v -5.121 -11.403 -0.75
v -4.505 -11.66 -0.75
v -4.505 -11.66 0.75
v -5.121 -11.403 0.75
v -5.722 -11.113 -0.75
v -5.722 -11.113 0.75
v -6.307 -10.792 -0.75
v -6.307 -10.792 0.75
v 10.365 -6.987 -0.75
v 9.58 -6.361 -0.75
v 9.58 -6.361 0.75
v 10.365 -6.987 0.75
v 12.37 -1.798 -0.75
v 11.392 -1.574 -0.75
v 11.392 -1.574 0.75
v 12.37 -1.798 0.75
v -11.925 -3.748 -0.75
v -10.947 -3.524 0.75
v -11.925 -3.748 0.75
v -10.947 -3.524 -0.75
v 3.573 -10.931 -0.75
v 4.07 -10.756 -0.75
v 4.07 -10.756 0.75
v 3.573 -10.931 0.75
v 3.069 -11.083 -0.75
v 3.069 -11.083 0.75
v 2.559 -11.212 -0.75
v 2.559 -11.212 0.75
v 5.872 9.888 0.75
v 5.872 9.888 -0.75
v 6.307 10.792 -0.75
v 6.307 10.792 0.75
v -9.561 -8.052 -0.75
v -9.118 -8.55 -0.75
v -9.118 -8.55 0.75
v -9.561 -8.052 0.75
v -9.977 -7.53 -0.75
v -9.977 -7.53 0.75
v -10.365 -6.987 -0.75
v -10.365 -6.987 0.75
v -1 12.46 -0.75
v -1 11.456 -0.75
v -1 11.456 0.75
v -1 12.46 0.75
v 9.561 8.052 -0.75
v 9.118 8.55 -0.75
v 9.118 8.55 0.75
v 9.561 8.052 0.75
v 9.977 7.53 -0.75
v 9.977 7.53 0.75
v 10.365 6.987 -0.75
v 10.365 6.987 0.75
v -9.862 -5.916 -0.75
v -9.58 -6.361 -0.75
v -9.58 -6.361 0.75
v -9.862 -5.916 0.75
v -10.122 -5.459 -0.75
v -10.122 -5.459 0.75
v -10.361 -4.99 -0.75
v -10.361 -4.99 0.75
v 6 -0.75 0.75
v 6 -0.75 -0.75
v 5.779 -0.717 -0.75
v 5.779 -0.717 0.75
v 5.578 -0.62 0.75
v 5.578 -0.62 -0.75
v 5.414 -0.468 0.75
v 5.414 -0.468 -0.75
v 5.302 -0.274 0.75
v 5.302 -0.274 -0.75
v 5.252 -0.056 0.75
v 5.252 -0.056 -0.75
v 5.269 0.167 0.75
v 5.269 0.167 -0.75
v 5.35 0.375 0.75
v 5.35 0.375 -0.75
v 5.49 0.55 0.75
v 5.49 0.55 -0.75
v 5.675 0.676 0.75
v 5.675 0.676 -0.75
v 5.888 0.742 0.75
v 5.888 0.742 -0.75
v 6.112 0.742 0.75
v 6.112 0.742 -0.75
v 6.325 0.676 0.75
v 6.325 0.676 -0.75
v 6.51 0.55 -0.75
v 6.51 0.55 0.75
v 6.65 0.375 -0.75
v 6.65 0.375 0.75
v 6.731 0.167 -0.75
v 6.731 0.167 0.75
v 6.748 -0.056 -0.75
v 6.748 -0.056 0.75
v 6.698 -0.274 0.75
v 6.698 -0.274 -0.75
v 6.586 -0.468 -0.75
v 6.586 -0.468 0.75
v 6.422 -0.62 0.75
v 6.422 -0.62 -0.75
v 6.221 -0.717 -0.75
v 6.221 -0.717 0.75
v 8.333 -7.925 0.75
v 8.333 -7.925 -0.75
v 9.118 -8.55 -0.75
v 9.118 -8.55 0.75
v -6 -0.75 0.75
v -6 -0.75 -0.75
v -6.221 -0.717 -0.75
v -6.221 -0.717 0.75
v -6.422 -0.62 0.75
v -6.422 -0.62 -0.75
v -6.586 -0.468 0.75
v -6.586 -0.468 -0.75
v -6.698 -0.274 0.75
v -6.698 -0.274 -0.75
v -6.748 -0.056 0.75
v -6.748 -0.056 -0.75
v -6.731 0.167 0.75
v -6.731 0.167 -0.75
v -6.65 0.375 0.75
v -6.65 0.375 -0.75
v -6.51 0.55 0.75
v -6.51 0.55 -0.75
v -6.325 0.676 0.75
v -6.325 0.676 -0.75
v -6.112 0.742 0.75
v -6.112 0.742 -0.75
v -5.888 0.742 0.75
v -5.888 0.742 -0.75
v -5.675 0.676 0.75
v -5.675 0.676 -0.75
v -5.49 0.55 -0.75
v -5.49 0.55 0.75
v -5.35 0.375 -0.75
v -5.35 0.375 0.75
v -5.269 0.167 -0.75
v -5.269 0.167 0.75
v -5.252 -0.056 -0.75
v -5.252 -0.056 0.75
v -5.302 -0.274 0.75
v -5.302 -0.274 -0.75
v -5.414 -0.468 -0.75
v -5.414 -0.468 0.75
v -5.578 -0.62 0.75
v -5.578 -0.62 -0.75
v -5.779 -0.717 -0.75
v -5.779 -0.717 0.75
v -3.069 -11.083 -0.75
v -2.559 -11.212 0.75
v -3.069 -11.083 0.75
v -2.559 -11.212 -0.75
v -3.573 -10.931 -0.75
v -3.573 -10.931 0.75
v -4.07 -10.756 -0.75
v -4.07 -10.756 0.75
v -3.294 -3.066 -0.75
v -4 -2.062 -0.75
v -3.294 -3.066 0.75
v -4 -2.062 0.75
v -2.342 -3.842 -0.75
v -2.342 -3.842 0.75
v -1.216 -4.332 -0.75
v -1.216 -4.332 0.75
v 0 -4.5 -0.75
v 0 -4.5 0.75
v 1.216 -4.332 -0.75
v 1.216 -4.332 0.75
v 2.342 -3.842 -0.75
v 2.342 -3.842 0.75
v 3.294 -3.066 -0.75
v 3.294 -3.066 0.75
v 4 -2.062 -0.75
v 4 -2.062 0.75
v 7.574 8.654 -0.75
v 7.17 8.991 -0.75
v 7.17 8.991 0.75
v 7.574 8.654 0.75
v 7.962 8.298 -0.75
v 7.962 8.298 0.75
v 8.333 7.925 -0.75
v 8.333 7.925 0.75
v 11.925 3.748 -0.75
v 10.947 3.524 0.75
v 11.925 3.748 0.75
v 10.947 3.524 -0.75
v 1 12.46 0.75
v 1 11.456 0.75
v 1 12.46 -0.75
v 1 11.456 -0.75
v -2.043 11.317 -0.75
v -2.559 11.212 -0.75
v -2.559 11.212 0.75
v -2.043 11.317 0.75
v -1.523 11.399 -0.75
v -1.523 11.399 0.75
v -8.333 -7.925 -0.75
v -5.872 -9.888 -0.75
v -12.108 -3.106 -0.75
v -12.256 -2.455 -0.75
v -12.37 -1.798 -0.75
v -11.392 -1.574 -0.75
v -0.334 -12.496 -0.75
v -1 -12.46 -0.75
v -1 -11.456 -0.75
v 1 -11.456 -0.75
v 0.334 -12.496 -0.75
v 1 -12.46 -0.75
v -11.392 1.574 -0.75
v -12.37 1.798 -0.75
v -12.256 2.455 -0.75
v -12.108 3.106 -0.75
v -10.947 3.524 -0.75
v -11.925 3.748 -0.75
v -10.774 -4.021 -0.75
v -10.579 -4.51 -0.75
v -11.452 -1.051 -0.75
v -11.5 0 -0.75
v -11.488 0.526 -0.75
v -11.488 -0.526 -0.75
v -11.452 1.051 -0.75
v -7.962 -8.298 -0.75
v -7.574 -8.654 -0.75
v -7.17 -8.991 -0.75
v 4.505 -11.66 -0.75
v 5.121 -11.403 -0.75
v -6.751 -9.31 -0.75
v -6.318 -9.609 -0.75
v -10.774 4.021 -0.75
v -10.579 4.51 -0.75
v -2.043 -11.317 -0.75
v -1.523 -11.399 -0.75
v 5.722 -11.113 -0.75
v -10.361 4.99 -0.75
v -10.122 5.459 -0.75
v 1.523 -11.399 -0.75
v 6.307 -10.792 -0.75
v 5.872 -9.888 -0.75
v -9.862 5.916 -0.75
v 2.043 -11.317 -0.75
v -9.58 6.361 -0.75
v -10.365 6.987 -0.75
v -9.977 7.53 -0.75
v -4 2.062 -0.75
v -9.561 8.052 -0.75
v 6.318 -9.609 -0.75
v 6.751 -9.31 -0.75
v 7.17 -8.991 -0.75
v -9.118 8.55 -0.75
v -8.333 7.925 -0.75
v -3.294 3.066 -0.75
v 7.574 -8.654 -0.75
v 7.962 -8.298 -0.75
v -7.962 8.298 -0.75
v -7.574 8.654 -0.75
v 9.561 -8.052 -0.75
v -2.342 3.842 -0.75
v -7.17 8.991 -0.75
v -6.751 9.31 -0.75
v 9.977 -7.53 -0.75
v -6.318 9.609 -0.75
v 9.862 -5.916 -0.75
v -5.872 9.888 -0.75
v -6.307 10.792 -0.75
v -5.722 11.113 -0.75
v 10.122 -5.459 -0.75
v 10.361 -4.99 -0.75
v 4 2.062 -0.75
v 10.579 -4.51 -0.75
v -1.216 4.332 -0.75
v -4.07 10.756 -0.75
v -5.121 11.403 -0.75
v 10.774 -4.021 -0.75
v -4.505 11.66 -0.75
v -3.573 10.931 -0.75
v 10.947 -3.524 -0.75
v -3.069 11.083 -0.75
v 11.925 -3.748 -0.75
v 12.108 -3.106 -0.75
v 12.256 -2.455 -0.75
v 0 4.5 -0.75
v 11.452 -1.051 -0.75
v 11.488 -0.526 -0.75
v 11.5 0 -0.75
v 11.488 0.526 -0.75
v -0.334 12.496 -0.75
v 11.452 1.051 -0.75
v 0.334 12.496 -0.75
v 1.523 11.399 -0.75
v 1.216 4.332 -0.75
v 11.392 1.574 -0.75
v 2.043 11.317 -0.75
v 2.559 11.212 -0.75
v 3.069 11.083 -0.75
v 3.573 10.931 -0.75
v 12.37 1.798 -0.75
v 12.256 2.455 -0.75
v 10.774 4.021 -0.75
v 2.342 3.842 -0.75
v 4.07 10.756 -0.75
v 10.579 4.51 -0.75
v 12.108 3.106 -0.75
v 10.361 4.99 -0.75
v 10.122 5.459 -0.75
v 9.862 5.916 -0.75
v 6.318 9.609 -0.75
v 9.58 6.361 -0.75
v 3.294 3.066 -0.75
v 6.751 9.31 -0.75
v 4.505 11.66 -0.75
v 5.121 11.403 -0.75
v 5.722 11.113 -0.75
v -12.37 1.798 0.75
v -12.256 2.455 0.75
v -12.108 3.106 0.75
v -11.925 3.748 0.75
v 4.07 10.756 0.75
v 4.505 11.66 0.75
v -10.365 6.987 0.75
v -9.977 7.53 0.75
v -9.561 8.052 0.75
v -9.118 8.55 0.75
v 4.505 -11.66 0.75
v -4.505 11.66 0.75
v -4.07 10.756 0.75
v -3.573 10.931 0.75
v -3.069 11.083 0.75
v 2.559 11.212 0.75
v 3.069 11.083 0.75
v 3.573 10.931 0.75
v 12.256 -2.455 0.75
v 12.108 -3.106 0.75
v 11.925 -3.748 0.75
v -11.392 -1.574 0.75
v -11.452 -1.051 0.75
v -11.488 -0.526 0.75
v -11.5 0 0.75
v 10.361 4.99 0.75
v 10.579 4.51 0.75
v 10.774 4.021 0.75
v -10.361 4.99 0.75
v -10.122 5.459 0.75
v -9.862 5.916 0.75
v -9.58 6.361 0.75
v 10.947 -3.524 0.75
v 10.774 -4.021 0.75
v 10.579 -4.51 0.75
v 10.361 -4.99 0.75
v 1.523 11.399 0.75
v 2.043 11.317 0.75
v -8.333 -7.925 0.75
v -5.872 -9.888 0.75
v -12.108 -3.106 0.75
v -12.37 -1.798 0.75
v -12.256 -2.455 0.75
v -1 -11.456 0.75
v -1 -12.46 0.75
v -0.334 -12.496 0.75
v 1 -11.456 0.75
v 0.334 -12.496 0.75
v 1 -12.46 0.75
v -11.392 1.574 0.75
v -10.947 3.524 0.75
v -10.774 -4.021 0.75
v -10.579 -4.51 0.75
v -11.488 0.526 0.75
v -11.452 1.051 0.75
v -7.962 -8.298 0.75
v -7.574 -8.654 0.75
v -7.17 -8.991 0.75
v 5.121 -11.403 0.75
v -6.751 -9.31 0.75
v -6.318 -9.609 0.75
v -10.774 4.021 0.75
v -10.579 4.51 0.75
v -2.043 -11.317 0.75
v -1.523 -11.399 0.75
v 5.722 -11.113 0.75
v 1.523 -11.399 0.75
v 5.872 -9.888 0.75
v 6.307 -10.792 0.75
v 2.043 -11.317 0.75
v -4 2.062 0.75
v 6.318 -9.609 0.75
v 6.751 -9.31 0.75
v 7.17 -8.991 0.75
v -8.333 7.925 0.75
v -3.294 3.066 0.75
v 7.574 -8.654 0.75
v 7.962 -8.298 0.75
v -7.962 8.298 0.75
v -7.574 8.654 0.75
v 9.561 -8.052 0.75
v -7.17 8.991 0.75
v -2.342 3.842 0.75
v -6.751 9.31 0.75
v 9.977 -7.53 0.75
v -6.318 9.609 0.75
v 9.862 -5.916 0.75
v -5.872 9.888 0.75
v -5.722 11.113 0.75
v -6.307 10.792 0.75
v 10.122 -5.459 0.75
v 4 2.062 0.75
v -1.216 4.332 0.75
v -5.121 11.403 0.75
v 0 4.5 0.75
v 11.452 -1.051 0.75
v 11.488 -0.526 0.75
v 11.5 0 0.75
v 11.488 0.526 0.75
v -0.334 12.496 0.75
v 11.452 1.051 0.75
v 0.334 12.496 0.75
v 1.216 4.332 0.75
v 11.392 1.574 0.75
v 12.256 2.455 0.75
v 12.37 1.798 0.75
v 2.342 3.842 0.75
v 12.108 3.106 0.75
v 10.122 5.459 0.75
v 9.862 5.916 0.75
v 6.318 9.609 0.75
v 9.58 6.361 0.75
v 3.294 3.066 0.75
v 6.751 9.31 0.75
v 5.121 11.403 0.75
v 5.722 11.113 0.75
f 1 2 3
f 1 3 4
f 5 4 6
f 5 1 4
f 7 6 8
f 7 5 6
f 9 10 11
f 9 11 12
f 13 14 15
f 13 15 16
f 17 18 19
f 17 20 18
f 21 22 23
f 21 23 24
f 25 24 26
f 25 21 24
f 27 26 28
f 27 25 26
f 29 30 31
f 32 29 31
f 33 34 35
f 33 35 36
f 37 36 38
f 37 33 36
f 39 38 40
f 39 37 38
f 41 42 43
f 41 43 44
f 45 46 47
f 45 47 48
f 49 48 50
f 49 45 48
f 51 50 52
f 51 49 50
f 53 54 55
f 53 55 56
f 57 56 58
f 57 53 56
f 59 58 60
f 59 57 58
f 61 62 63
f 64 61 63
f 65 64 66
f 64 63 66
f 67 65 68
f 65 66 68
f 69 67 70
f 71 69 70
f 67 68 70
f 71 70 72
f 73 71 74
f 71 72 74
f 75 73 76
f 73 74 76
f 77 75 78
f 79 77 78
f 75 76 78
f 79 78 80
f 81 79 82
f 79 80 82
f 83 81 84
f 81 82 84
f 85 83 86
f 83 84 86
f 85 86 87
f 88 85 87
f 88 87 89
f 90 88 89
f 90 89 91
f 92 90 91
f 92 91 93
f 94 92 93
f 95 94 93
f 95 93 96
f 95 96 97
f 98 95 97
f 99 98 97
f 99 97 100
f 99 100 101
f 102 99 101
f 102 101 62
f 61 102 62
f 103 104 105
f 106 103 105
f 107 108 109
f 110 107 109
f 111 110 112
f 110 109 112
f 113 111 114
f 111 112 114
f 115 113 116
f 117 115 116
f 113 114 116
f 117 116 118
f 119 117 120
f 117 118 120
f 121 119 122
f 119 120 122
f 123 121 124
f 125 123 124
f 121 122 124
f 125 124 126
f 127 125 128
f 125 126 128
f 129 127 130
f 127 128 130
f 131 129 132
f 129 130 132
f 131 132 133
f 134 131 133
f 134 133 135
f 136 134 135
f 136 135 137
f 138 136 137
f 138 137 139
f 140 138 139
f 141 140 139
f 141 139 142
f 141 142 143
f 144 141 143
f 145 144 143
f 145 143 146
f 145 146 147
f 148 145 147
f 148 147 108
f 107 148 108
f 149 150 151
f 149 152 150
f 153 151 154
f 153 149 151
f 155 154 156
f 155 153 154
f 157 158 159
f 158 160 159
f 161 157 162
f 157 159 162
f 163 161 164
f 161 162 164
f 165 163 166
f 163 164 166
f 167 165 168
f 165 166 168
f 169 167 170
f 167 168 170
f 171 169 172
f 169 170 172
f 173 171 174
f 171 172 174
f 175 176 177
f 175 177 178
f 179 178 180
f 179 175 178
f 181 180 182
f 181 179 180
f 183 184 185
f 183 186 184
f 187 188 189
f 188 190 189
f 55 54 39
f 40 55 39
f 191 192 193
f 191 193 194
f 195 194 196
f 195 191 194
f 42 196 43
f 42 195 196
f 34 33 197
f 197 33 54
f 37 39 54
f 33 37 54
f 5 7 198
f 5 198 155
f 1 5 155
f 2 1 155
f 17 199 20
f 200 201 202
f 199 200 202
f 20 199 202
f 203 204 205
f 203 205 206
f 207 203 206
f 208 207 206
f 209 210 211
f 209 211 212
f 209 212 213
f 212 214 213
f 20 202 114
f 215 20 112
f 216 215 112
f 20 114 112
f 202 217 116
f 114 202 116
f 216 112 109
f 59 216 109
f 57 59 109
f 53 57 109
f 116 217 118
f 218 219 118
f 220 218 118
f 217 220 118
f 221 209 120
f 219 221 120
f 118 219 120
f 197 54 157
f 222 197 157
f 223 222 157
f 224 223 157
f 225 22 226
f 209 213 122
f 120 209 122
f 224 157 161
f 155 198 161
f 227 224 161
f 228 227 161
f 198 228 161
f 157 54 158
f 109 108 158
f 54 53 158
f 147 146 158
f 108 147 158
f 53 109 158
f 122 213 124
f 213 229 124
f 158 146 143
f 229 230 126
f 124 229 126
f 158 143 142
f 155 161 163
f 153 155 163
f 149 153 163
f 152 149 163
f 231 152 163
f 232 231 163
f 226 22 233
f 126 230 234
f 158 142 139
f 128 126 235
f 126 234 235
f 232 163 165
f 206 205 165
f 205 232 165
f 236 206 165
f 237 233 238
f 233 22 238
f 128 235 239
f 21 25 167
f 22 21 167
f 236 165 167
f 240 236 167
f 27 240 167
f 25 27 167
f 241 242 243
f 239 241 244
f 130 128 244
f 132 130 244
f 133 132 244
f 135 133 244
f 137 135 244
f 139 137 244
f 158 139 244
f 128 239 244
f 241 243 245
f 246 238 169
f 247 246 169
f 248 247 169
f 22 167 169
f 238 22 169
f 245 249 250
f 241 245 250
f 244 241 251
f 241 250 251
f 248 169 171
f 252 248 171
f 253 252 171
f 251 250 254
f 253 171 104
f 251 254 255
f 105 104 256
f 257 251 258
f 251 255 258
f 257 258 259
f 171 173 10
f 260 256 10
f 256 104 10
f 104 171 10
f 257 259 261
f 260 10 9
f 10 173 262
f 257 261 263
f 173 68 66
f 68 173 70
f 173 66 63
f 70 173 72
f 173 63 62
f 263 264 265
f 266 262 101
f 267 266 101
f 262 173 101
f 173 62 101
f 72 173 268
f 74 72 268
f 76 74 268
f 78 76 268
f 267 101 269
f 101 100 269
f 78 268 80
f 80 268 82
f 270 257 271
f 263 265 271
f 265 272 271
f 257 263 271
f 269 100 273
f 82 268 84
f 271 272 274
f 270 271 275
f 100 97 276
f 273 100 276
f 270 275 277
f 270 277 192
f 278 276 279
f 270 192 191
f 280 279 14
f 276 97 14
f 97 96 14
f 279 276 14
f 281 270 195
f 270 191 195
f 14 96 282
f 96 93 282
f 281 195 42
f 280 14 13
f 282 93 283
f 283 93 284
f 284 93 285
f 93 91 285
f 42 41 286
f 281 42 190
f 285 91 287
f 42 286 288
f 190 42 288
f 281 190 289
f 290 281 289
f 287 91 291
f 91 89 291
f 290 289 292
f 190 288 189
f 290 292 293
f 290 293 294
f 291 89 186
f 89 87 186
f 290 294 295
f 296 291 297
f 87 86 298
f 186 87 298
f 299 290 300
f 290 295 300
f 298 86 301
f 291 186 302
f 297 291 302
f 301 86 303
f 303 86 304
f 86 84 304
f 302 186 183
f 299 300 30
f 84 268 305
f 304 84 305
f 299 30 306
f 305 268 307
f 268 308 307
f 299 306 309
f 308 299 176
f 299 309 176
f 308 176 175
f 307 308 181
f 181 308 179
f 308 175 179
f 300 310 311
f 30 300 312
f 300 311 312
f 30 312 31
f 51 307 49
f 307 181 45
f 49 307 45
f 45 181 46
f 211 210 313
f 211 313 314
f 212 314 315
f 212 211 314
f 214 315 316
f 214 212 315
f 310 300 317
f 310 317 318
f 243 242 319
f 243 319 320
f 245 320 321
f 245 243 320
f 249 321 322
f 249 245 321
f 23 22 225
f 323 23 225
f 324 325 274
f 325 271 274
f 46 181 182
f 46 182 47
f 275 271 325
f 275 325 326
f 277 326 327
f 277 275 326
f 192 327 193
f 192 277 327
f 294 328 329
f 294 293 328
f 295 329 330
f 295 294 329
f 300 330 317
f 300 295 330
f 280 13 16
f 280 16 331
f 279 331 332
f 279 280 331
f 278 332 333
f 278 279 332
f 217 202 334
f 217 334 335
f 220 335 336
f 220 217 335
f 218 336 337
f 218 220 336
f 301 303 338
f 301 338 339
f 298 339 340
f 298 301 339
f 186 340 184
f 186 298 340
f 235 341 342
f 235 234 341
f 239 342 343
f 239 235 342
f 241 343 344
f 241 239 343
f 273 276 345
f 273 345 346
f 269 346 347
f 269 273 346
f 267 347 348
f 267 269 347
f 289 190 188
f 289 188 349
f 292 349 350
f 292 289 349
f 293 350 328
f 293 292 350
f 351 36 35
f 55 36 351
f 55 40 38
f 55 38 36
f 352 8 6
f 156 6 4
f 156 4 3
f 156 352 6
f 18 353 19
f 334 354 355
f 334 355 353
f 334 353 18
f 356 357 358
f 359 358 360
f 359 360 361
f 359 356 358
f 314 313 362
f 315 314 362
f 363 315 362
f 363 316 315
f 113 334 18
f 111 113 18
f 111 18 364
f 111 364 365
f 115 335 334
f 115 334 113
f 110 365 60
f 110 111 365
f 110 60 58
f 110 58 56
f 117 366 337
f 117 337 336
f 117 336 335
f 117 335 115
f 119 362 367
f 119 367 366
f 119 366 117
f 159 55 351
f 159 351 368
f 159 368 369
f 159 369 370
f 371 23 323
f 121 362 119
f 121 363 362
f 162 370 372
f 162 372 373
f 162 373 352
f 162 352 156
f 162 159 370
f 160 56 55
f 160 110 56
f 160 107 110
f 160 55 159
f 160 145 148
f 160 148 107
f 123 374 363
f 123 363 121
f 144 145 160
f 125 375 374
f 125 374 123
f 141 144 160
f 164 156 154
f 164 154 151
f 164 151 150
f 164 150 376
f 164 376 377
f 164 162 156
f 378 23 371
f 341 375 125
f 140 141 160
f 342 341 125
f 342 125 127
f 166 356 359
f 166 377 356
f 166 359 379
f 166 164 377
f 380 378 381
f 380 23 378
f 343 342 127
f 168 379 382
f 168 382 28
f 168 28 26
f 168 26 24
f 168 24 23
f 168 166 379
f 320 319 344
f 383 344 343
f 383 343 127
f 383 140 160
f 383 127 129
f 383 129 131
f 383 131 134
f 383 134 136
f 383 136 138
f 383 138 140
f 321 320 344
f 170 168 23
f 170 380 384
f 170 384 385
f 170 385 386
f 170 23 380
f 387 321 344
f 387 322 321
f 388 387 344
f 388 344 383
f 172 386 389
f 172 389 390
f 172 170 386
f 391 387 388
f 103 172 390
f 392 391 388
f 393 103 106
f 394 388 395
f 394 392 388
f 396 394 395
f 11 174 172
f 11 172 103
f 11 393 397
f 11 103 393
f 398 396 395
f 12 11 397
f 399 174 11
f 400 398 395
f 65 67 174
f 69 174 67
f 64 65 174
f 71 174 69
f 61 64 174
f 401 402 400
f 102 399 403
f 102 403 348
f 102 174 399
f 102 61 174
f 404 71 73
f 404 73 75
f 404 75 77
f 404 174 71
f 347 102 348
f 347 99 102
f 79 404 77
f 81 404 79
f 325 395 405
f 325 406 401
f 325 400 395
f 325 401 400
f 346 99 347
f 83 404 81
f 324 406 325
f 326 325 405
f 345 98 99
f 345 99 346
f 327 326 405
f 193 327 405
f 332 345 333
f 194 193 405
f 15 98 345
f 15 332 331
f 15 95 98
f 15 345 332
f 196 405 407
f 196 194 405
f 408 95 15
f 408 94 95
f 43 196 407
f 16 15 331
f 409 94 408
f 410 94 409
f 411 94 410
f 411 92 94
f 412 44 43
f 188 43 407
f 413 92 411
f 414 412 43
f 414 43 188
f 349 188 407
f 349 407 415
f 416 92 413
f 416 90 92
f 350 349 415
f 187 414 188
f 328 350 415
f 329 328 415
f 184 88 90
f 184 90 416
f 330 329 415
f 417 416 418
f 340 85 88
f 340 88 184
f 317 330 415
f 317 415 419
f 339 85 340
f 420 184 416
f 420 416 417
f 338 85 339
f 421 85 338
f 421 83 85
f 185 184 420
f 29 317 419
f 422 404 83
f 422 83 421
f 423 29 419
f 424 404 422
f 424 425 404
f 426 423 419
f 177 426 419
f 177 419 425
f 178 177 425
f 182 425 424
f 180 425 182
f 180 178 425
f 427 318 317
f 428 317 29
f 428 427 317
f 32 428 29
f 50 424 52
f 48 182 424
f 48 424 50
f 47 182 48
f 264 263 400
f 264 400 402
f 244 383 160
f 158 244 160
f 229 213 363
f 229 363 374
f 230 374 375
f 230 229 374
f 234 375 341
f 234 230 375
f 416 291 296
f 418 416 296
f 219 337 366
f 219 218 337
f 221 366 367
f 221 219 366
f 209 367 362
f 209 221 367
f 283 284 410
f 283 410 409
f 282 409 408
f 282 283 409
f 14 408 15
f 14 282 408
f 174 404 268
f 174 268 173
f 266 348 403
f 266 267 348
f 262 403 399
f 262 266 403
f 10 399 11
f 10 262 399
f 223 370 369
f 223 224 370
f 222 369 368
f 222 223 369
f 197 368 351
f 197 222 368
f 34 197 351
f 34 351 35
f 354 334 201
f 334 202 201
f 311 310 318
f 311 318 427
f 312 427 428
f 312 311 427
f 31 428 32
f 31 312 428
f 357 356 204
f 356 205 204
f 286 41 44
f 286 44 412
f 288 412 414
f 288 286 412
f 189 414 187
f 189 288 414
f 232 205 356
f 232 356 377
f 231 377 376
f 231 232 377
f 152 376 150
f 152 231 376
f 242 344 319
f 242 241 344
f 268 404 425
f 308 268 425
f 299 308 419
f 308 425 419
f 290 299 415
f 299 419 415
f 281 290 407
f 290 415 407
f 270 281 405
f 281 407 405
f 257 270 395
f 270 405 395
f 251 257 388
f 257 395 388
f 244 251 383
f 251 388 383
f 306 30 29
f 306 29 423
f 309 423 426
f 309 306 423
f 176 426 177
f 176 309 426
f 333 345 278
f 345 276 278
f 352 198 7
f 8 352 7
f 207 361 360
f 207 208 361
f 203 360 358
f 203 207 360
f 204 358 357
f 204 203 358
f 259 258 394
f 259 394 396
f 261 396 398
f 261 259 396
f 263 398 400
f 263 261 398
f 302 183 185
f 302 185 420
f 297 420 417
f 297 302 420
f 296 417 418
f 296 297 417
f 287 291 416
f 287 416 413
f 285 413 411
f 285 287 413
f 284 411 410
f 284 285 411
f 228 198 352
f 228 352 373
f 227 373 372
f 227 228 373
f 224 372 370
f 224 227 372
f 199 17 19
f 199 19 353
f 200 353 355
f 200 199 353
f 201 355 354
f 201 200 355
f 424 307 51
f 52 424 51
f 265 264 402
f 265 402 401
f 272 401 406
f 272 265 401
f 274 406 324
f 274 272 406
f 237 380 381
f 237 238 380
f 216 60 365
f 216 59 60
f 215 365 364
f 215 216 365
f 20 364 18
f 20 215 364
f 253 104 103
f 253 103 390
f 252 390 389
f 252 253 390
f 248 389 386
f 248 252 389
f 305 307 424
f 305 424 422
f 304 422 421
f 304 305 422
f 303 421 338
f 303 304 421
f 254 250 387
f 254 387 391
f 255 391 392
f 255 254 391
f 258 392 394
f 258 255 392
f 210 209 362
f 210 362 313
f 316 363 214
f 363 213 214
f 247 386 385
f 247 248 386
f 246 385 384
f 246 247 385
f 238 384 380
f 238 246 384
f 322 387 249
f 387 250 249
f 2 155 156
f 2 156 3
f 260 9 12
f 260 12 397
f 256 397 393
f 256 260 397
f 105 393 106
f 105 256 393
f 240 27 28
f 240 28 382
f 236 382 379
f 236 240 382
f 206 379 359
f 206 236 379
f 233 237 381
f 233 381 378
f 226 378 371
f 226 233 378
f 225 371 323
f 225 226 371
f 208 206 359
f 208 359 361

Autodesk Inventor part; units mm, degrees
ref_plane "YZ Plane" through (0, 0, 0) normal (1, 0, 0) x (0, 1, 0)
ref_plane "XZ Plane" through (0, 0, 0) normal (0, 1, 0) x (-1, 0, 0)
ref_plane "XY Plane" through (0, 0, 0) normal (0, 0, 1) x (1, 0, 0)
sketch "Sketch1" plane through (0, 0, 0) normal (0, 0, 1) x (1, 0, 0)
  line L0 (0, 0) -> (-2.559, 11.2117)
  line L1 (0, 0) -> (2.559, 11.2117)
  line L2 (0, 0) -> (0, 11.5) construction
  line L3 (-1, 11.4564) -> (-1, 12.4599)
  line L4 (1, 11.4564) -> (1, 12.4599)
  line L5 (-1, 12.4599) -> (1, 12.4599) construction
  arc A0 (1, 12.4599) -> (-1, 12.4599) centre (0, 0) ccw
  line L6 (-1, 11.4564) -> (1, 11.4564) construction
  arc A1 (2.559, 11.2117) -> (1, 11.4564) centre (0, 0) ccw
  arc A2 (-1, 11.4564) -> (-2.559, 11.2117) centre (0, 0) ccw
  line L7 (-2.559, 11.2117) -> (2.559, 11.2117) construction
  point P0 (0, 12.5)
  point P1 (0, 12.4599)
  dimension "d0" = 25.714
  dimension "d2" = 12.5
  dimension "d3" = 2
  dimension "d4" = 11.5
extrude "Extrusion1" add sketch "Sketch1" along normal mid plane 1.5
pattern_circular "Circular Pattern1" count 14 over 360 about axis through (0, 0, -0.75) along (0, 0, 1)
sketch "Sketch2" plane through (0, 0, 0.75) normal (0, 0, 1) x (1, 0, 0)
  circle A0 centre (0, 0) radius 4.5
  line L0 (-4, 2.0616) -> (-4, -2.0616)
  line L1 (4, 2.0616) -> (4, -2.0616)
  dimension "d10" = 9
  dimension "d11" = 8
extrude "Extrusion2" cut sketch "Sketch2" against normal through all contours L1 A0 L0
sketch "Sketch3" plane through (0, 0, 0.75) normal (0, 0, 1) x (1, 0, 0)
  line L0 (-6, 0) -> (6, 0) construction
  point P0 (0, 0)
  point P1 (0, 0)
  dimension "d14" = 12
hole "Hole1" at (-6, 0, 0.75) at (6, 0, 0.75) direction (0, 0, -1) diameter 1.5 end through all
properties part number "404-03" material "Steel, Mild"
